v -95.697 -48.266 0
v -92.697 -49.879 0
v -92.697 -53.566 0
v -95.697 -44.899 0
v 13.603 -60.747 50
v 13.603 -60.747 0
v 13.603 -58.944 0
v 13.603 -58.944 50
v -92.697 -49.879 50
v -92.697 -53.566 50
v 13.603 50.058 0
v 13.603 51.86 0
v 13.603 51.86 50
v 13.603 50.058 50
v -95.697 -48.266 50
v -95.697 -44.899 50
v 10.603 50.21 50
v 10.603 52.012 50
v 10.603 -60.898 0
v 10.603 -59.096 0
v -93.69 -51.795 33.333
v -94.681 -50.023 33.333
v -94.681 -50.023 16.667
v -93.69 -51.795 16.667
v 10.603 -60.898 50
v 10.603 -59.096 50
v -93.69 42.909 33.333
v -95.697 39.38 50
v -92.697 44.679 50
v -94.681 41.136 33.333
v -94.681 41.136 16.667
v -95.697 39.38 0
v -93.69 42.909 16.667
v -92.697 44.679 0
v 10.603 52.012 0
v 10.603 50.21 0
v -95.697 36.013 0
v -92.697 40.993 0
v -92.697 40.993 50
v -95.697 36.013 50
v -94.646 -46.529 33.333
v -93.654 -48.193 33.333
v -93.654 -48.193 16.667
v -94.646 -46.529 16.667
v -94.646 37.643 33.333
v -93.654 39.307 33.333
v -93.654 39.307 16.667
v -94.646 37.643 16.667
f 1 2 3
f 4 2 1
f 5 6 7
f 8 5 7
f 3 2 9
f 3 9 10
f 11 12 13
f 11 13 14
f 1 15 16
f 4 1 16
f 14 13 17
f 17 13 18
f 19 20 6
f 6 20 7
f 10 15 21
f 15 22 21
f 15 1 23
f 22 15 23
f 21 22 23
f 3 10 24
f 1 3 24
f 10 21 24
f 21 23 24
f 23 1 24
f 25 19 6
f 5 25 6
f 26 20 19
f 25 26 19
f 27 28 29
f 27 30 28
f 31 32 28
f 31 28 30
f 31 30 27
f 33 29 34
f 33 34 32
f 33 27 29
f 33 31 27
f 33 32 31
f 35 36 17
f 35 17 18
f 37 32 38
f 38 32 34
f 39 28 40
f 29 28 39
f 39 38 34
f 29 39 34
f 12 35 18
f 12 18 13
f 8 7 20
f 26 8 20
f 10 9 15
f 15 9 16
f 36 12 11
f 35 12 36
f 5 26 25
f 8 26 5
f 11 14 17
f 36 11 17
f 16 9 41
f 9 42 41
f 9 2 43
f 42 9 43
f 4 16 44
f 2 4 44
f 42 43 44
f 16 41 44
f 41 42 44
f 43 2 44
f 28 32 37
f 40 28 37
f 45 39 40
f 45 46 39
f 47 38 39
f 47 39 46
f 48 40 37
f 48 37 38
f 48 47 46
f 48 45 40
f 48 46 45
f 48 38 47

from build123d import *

# Parameters (mm, degrees)
BOSS_EXTRUDE1_DEPTH   = 50
BOSS_EXTRUDE1_2_DEPTH = 50
BOSS_EXTRUDE1_3_DEPTH = 50
BOSS_EXTRUDE1_4_DEPTH = 50


with BuildPart() as part:
    # Sketch3 → Boss-Extrude1 (new body)
    with BuildSketch(Plane.XY):
        Polygon((10.602606635, 50.209757573), (10.602606635, 52.012055288), (13.602606635, 51.860424765), (13.602606635, 50.05812705), align=None)
    extrude(amount=BOSS_EXTRUDE1_DEPTH)


with BuildPart() as body_2:
    # Sketch3 → Boss-Extrude1 2 (new body)
    with BuildSketch(Plane.XY):
        with BuildLine():
            Line((-92.697393356, -49.878847446), (-92.697393356, -53.565685001))
            add(Edge.make_bspline(
                [(-95.697393356, -48.266224595), (-94.658566007, -50.009324516), (-93.700656209, -51.801163514), (-92.697393356, -53.565685001)],
                knots=[0, 0, 0, 0, 0.230072601, 0.230072601, 0.230072601, 0.230072601], degree=3))
            Line((-95.697393356, -48.266224595), (-95.697393356, -44.8989813))
            add(Edge.make_bspline(
                [(-92.697393356, -49.878847446), (-93.643617645, -48.187277247), (-94.609063153, -46.50700723), (-95.697393356, -44.8989813)],
                knots=[0.788966629, 0.788966629, 0.788966629, 0.788966629, 1, 1, 1, 1], degree=3))
        make_face()
    extrude(amount=BOSS_EXTRUDE1_2_DEPTH)


with BuildPart() as body_3:
    # Sketch3 → Boss-Extrude1 3 (new body)
    with BuildSketch(Plane.XY):
        Polygon((10.602606635, -59.096013497), (10.602606635, -60.898311212), (13.602606635, -60.746680689), (13.602606635, -58.944382974), align=None)
    extrude(amount=BOSS_EXTRUDE1_3_DEPTH)


with BuildPart() as body_4:
    # Sketch3 → Boss-Extrude1 4 (new body)
    with BuildSketch(Plane.XY):
        with BuildLine():
            Line((-92.697393356, 40.992591522), (-92.697393362, 44.679429081))
            add(Edge.make_bspline(
                [(-95.697393356, 39.379968671), (-94.658566009, 41.123068593), (-93.700656214, 42.914907592), (-92.697393362, 44.679429081)],
                knots=[0, 0, 0, 0, 0.230072601, 0.230072601, 0.230072601, 0.230072601], degree=3))
            Line((-95.697393356, 39.379968671), (-95.697393356, 36.012725375))
            add(Edge.make_bspline(
                [(-92.697393356, 40.992591522), (-93.643617645, 39.301021323), (-94.609063153, 37.620751306), (-95.697393356, 36.012725375)],
                knots=[0.788966629, 0.788966629, 0.788966629, 0.788966629, 1, 1, 1, 1], degree=3))
        make_face()
    extrude(amount=BOSS_EXTRUDE1_4_DEPTH)


solid = Compound([part.part, body_2.part, body_3.part, body_4.part])
